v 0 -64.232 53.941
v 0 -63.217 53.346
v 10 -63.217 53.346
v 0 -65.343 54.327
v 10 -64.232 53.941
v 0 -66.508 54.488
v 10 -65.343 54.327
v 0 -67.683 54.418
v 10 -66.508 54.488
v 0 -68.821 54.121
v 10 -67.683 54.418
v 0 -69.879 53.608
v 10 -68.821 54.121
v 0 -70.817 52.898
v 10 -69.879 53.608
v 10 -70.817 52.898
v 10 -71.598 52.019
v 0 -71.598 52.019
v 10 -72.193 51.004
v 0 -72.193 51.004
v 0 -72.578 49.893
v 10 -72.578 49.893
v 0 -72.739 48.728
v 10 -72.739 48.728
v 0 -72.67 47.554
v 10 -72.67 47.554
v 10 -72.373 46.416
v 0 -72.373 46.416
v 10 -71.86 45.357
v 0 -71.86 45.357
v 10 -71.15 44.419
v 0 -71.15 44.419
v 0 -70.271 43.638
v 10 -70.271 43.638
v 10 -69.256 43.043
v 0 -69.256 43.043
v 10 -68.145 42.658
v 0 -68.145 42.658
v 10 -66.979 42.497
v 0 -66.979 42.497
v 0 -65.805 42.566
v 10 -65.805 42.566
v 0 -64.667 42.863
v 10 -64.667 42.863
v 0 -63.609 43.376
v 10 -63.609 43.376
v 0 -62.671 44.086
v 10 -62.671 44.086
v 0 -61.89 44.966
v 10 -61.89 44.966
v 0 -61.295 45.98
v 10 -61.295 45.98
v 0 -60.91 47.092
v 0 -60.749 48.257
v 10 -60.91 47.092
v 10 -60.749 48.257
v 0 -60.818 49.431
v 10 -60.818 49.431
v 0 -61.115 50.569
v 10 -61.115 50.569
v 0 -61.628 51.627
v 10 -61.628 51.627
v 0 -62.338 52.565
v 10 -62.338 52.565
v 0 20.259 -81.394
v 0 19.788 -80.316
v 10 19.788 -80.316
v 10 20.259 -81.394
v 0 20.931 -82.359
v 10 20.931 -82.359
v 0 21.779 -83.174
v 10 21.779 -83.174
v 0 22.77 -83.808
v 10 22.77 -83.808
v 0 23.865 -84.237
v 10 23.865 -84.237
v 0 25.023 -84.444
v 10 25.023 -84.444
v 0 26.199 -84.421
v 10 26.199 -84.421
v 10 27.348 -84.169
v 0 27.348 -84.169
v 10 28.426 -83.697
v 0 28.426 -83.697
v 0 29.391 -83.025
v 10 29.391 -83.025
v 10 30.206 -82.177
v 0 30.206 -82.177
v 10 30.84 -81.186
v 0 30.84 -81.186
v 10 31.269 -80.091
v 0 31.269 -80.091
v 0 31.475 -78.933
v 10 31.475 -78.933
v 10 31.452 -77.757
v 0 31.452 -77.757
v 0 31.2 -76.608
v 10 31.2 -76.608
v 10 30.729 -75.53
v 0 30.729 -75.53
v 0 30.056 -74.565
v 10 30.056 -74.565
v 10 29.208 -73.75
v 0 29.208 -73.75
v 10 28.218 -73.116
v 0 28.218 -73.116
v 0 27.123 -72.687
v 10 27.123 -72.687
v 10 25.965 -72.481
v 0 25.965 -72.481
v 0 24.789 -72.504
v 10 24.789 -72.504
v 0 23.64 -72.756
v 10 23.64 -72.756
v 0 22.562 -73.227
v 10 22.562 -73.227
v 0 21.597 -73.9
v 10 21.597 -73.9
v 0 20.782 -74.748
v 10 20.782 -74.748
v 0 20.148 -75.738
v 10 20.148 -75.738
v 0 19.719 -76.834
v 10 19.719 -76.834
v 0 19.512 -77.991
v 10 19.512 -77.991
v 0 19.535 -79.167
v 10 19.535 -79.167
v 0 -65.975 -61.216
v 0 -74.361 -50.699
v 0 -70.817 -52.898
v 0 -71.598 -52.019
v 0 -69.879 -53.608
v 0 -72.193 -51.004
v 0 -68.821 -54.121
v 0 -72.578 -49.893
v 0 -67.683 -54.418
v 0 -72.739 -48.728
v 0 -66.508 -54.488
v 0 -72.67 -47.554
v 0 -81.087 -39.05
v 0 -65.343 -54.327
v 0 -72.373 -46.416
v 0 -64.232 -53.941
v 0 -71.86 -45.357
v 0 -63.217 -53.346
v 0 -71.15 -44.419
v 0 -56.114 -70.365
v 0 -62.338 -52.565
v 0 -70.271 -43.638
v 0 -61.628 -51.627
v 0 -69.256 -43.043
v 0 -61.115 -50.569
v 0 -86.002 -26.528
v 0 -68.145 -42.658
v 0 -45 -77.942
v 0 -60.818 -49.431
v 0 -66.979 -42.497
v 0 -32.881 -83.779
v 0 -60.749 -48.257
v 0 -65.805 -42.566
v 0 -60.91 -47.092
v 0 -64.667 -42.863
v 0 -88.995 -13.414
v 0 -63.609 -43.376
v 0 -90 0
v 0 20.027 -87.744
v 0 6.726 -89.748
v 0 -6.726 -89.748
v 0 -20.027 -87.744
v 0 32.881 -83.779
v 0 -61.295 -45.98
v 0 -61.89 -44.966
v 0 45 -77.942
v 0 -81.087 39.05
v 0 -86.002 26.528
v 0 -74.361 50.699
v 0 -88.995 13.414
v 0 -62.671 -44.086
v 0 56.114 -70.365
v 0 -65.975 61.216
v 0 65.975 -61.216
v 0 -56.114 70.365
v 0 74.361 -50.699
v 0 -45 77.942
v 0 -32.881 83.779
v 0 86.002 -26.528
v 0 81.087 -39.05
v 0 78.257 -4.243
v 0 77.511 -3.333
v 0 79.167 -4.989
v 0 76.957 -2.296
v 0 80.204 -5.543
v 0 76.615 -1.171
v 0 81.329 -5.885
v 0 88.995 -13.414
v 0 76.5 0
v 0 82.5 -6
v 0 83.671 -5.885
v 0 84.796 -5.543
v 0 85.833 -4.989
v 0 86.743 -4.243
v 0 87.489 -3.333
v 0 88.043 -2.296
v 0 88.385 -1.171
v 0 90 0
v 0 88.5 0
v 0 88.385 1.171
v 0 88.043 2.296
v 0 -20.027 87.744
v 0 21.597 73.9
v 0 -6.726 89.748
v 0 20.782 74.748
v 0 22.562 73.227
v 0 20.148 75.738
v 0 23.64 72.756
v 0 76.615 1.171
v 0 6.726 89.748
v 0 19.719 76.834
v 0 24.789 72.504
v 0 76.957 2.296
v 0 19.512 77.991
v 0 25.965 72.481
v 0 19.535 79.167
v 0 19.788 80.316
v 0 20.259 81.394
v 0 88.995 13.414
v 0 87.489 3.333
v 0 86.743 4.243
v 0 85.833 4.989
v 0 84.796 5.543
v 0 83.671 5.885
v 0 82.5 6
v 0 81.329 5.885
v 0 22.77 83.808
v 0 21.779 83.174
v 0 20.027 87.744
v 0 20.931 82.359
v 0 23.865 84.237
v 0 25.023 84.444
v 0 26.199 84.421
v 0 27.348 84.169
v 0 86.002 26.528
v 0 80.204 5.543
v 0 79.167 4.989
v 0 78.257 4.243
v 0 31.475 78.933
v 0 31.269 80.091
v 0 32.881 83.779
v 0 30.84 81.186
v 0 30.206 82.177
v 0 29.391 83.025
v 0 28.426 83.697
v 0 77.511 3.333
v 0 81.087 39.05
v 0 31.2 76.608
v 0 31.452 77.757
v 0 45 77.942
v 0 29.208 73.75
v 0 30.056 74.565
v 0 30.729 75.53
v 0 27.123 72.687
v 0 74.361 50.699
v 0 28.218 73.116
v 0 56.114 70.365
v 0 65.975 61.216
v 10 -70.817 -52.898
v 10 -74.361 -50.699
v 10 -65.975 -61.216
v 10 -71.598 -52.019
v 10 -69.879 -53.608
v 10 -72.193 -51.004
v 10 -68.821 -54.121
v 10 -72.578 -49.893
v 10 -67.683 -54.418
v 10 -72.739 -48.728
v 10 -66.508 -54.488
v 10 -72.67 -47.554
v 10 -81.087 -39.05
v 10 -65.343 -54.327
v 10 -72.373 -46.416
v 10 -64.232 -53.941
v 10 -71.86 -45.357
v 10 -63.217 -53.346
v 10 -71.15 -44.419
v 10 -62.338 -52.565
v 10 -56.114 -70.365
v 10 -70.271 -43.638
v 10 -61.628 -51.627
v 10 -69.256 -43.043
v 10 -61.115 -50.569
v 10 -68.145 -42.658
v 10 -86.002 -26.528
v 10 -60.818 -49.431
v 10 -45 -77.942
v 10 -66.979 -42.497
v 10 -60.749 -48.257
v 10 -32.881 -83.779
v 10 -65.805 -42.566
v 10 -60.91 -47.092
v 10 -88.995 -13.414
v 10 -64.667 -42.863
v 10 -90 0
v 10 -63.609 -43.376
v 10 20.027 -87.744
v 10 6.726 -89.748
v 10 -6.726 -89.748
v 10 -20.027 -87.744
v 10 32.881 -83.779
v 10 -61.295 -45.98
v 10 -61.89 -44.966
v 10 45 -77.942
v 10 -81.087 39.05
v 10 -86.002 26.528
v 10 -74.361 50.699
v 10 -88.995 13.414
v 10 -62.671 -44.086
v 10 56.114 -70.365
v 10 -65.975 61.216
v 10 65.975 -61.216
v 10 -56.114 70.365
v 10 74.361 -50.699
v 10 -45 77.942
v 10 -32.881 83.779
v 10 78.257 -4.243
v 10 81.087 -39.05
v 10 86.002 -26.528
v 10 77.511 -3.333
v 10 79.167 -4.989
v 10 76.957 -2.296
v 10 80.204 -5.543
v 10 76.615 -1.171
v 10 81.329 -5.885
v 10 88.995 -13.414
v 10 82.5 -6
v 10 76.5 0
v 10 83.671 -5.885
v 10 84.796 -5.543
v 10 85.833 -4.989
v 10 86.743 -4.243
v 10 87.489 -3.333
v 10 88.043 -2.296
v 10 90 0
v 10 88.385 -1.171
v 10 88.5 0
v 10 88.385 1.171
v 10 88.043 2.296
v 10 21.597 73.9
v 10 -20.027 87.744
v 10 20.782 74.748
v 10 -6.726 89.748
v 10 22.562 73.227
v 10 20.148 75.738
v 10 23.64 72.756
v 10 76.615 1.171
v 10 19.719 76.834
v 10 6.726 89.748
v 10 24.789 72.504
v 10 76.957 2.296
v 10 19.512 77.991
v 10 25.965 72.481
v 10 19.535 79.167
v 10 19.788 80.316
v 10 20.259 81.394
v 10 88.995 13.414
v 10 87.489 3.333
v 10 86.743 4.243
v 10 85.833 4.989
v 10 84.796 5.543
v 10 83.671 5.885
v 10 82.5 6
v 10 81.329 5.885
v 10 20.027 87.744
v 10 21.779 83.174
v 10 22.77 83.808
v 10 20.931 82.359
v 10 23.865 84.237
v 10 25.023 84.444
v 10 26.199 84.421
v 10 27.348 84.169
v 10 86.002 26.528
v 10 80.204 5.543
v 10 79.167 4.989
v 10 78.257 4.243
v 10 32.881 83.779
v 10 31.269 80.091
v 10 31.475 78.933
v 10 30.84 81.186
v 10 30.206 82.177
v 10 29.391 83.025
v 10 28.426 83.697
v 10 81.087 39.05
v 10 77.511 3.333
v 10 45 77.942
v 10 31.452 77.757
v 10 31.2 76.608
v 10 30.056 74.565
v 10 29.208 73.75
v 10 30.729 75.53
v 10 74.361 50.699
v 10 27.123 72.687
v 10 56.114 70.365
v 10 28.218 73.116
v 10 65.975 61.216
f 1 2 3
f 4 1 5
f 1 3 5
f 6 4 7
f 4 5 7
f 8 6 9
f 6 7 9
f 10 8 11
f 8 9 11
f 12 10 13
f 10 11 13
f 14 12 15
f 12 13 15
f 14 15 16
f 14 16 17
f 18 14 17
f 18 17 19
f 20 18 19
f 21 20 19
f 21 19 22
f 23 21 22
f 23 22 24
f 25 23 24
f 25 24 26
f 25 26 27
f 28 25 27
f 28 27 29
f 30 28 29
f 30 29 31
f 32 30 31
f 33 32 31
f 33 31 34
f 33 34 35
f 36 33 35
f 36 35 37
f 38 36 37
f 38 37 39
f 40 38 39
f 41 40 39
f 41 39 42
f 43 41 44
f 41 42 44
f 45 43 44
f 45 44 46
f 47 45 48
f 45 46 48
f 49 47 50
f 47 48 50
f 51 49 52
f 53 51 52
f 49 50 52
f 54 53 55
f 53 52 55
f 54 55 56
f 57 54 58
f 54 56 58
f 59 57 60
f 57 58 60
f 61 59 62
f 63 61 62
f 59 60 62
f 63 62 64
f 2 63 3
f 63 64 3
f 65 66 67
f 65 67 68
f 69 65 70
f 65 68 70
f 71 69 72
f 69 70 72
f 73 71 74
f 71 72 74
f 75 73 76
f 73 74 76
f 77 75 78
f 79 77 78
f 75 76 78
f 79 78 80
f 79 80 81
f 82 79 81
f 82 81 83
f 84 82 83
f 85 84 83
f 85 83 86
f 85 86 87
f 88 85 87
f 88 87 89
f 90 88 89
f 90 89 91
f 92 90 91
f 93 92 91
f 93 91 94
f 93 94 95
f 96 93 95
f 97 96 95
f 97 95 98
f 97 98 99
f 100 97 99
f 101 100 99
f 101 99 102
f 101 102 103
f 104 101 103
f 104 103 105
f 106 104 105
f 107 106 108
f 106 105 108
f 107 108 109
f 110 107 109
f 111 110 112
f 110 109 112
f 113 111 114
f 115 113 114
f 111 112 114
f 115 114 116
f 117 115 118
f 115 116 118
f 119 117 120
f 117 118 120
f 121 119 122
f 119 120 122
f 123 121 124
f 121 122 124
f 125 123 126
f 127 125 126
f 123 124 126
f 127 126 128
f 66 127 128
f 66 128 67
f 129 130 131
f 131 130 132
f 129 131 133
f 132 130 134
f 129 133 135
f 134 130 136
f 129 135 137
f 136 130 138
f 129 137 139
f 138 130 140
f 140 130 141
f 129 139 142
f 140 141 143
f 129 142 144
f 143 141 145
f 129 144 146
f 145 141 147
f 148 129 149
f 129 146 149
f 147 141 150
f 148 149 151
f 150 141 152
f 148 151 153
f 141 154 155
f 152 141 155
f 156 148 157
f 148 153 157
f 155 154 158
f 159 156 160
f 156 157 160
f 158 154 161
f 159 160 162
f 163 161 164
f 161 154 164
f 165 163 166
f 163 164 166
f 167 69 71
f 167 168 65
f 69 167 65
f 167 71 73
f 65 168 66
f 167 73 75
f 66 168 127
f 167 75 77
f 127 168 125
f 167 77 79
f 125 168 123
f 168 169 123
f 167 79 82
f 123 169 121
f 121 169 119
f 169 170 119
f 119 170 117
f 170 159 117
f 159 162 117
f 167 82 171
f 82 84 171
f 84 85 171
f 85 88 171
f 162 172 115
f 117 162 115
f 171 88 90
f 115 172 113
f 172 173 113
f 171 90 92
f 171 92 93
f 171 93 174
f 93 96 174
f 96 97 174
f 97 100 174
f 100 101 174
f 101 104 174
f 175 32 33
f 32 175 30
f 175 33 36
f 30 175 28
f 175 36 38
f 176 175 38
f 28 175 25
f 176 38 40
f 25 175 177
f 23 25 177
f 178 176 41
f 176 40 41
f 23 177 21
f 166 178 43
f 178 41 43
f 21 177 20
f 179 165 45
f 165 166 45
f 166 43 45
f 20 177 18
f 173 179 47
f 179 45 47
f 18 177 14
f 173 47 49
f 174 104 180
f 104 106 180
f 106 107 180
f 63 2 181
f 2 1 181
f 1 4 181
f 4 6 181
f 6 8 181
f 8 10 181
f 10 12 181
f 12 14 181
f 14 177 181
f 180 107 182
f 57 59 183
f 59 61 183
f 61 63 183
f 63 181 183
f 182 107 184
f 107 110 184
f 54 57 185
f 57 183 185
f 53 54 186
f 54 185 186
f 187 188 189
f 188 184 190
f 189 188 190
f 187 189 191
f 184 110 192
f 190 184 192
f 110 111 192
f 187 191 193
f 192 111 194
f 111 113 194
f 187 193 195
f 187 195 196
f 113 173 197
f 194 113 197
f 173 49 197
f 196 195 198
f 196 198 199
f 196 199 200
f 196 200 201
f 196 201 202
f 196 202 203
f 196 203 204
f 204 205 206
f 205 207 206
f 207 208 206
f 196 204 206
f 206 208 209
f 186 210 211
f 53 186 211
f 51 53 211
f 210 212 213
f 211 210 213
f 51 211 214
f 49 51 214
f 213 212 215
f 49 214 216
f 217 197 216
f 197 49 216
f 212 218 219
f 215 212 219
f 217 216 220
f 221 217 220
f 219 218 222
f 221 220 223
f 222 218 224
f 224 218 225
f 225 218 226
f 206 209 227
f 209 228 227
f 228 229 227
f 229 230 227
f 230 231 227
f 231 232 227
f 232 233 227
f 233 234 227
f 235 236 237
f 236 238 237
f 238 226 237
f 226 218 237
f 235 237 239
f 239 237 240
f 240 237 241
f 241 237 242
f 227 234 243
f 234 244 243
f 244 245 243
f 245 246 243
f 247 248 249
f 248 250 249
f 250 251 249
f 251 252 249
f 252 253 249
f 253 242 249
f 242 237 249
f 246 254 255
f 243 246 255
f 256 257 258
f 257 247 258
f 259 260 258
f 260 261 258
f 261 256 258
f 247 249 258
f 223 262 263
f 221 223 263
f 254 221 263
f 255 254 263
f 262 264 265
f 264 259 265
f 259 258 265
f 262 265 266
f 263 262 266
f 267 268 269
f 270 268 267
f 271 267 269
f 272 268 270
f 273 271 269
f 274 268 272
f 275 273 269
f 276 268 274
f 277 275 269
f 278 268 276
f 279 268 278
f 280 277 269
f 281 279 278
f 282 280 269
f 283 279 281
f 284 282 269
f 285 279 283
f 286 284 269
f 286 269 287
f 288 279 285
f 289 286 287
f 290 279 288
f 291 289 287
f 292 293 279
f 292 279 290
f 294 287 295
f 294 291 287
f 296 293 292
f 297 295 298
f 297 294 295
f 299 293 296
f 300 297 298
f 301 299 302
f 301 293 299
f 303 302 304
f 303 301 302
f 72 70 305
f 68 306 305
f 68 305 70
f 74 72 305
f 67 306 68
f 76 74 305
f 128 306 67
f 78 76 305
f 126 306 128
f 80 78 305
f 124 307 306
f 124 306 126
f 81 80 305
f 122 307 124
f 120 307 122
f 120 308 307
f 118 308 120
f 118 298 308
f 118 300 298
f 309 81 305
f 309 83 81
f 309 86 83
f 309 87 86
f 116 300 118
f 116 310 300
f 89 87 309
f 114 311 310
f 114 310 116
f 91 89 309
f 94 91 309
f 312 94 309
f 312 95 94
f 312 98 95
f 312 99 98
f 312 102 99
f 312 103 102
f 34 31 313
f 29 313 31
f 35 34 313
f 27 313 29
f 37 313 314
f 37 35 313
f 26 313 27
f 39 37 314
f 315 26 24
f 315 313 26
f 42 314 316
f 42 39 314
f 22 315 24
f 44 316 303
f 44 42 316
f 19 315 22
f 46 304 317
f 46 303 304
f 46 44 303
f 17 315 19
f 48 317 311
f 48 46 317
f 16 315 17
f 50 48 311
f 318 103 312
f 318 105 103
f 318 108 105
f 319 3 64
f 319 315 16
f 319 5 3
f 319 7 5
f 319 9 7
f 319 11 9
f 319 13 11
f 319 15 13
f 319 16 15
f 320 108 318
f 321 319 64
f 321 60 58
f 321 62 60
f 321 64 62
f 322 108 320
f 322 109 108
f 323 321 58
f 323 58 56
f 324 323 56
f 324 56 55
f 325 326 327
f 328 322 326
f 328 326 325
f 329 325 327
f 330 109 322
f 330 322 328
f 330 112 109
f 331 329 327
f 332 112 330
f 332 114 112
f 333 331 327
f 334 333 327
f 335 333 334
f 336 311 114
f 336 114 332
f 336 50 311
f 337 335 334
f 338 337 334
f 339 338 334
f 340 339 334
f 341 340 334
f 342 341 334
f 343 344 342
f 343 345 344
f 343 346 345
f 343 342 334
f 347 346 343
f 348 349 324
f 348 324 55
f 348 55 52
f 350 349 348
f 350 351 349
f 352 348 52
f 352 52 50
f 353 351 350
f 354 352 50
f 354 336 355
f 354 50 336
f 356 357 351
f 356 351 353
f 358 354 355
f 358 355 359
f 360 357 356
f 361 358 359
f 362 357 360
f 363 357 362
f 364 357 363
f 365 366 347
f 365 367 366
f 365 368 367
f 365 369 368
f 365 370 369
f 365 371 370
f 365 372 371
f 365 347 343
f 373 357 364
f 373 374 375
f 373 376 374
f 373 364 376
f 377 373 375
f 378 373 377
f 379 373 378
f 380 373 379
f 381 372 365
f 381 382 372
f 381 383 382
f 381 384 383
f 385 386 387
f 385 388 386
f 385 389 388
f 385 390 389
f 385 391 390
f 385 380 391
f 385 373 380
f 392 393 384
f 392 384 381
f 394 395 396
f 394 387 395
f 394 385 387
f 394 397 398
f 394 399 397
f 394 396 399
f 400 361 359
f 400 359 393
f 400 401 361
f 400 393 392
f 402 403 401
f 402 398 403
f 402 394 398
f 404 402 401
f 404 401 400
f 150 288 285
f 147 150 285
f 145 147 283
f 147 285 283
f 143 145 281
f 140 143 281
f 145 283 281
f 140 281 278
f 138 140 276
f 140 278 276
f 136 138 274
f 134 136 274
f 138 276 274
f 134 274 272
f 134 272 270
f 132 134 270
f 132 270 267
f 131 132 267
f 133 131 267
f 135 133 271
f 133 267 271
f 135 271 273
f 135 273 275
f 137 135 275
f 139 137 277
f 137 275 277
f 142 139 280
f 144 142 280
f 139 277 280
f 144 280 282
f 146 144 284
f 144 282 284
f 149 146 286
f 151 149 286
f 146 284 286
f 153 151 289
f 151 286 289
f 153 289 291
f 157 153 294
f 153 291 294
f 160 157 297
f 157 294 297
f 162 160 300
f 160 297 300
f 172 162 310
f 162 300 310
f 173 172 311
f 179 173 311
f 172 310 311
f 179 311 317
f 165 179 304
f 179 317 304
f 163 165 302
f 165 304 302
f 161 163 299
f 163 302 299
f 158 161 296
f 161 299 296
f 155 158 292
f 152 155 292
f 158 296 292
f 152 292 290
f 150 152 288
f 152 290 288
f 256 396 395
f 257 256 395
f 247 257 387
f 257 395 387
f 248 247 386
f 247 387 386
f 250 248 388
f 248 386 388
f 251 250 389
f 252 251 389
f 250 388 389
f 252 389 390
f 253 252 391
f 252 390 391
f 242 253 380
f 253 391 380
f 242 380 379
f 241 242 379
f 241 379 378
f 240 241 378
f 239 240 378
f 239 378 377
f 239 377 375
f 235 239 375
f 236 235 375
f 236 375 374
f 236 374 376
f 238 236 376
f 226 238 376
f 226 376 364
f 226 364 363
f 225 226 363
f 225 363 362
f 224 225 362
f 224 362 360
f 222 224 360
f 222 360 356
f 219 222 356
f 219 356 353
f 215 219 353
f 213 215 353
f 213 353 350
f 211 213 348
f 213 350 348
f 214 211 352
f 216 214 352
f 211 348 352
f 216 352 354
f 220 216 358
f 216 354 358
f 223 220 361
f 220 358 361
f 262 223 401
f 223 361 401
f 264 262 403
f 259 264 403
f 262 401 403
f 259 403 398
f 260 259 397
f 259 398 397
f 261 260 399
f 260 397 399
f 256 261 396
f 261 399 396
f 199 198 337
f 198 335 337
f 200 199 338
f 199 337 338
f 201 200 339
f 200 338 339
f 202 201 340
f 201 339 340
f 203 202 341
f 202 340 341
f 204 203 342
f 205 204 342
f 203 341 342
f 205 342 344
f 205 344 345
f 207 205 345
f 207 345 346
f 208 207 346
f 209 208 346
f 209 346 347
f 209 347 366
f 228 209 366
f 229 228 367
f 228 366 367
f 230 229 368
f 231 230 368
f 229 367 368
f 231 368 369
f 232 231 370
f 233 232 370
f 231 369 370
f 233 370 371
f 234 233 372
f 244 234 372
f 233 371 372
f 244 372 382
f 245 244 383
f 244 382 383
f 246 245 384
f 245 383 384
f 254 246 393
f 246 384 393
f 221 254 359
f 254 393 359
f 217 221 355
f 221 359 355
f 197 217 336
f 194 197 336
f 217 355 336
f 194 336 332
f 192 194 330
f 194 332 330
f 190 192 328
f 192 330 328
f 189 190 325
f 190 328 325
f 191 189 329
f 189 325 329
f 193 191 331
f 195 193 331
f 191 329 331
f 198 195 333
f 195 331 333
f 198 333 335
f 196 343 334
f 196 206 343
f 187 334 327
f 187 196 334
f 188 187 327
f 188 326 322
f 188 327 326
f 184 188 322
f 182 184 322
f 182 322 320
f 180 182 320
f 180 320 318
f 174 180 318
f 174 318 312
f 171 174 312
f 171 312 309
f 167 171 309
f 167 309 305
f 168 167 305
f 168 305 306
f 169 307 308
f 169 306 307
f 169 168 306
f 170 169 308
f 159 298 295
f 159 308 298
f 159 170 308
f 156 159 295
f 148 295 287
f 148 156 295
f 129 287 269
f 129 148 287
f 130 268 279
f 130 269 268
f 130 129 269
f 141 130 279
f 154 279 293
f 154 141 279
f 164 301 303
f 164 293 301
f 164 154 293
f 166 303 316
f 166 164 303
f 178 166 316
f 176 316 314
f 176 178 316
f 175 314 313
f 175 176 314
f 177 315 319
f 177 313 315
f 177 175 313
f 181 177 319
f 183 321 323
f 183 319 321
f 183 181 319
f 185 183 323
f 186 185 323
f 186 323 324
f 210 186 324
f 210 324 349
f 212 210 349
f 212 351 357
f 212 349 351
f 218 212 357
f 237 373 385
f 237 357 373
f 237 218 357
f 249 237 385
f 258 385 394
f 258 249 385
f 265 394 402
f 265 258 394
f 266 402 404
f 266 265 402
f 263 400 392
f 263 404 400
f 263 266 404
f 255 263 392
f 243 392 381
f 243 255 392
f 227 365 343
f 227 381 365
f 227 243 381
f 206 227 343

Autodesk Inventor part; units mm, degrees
ref_plane "YZ Plane" through (0, 0, 0) normal (1, 0, 0) x (0, 1, 0)
ref_plane "XZ Plane" through (0, 0, 0) normal (0, 1, 0) x (-1, 0, 0)
ref_plane "XY Plane" through (0, 0, 0) normal (0, 0, 1) x (1, 0, 0)
sketch "Sketch1" plane through (0, 0, 0) normal (1, 0, 0) x (0, 1, 0)
  circle A0 centre (0, 0) radius 90
  dimension "d0" = 180
extrude "Extrusion1" add sketch "Sketch1" along normal blind 10
sketch "Sketch2" plane through (10, 0, 0) normal (1, 0, 0) x (0, 0, -1)
  circle A0 centre (0, 82.5) radius 6
  point P0 (0, 0)
  dimension "d3" = 82.5
  dimension "d4" = 12
extrude "Extrusion2" cut sketch "Sketch2" against normal blind 10
pattern_circular "Circular Pattern1" count 5 over 360 about axis through (10, 0, 0) along (1, 0, 0) of "Extrusion2"
properties part number "lip plate"
